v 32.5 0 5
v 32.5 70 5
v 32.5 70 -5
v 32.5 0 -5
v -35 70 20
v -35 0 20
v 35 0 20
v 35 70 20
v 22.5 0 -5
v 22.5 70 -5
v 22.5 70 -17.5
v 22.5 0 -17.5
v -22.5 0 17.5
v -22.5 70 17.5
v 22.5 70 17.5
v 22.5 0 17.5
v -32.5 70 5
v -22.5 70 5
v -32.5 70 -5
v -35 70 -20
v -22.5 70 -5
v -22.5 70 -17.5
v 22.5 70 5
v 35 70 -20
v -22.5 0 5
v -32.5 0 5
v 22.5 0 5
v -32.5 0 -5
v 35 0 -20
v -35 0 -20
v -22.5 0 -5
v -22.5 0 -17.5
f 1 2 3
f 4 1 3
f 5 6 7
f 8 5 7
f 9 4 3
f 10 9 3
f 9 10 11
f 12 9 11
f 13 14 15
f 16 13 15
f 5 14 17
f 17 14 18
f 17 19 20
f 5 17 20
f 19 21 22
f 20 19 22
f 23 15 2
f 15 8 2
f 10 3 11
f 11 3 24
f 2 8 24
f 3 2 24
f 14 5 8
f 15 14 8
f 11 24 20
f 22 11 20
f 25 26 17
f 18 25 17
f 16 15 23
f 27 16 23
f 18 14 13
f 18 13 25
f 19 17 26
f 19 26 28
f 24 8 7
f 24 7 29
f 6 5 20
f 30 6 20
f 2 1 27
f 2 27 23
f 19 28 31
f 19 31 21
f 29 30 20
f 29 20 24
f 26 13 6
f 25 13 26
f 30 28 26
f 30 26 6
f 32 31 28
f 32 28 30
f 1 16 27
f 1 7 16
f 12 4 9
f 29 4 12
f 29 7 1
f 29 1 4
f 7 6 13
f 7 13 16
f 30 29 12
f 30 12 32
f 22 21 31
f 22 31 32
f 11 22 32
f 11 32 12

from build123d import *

# Parameters (mm, degrees)
SKETCH3_W           = 70
SKETCH3_H           = 40
BOSS_EXTRUDE2_DEPTH = 70
SKETCH4_W           = 65
SKETCH4_H           = 35
CUT_EXTRUDE1_DEPTH  = 71
SKETCH5_W           = 12.5
SKETCH5_H           = 70
BOSS_EXTRUDE3_DEPTH = 10


with BuildPart() as part:
    # Sketch3 → Boss-Extrude2 (new body)
    with BuildSketch(Plane(origin=(0, 0, 0), x_dir=(1, 0, 0), z_dir=(0, 1, 0))):
        Rectangle(SKETCH3_W, SKETCH3_H)
    extrude(amount=BOSS_EXTRUDE2_DEPTH)

    # Sketch4 → Cut-Extrude1 (cut, through all)
    with BuildSketch(Plane(origin=(0, 70, 0), x_dir=(1, 0, 0), z_dir=(0, 1, 0))):
        Rectangle(SKETCH4_W, SKETCH4_H)
    extrude(amount=-CUT_EXTRUDE1_DEPTH, mode=Mode.SUBTRACT)

    # Sketch5 → Boss-Extrude3 (add)
    with BuildSketch(Plane(origin=(-32.5, 0, 0), x_dir=(0, 0, -1), z_dir=(1, 0, 0))):
        with Locations((-11.25, 35)):
            Rectangle(SKETCH5_W, SKETCH5_H)
        with Locations((11.25, 35)):
            Rectangle(SKETCH5_W, SKETCH5_H)
    boss_extrude3 = extrude(amount=BOSS_EXTRUDE3_DEPTH)

    # Mirror1: Boss-Extrude3 across plane
    add(boss_extrude3.mirror(Plane(origin=(0, 0, 0), x_dir=(0, 0, 1), z_dir=(1, 0, 0))))


solid = part.part
